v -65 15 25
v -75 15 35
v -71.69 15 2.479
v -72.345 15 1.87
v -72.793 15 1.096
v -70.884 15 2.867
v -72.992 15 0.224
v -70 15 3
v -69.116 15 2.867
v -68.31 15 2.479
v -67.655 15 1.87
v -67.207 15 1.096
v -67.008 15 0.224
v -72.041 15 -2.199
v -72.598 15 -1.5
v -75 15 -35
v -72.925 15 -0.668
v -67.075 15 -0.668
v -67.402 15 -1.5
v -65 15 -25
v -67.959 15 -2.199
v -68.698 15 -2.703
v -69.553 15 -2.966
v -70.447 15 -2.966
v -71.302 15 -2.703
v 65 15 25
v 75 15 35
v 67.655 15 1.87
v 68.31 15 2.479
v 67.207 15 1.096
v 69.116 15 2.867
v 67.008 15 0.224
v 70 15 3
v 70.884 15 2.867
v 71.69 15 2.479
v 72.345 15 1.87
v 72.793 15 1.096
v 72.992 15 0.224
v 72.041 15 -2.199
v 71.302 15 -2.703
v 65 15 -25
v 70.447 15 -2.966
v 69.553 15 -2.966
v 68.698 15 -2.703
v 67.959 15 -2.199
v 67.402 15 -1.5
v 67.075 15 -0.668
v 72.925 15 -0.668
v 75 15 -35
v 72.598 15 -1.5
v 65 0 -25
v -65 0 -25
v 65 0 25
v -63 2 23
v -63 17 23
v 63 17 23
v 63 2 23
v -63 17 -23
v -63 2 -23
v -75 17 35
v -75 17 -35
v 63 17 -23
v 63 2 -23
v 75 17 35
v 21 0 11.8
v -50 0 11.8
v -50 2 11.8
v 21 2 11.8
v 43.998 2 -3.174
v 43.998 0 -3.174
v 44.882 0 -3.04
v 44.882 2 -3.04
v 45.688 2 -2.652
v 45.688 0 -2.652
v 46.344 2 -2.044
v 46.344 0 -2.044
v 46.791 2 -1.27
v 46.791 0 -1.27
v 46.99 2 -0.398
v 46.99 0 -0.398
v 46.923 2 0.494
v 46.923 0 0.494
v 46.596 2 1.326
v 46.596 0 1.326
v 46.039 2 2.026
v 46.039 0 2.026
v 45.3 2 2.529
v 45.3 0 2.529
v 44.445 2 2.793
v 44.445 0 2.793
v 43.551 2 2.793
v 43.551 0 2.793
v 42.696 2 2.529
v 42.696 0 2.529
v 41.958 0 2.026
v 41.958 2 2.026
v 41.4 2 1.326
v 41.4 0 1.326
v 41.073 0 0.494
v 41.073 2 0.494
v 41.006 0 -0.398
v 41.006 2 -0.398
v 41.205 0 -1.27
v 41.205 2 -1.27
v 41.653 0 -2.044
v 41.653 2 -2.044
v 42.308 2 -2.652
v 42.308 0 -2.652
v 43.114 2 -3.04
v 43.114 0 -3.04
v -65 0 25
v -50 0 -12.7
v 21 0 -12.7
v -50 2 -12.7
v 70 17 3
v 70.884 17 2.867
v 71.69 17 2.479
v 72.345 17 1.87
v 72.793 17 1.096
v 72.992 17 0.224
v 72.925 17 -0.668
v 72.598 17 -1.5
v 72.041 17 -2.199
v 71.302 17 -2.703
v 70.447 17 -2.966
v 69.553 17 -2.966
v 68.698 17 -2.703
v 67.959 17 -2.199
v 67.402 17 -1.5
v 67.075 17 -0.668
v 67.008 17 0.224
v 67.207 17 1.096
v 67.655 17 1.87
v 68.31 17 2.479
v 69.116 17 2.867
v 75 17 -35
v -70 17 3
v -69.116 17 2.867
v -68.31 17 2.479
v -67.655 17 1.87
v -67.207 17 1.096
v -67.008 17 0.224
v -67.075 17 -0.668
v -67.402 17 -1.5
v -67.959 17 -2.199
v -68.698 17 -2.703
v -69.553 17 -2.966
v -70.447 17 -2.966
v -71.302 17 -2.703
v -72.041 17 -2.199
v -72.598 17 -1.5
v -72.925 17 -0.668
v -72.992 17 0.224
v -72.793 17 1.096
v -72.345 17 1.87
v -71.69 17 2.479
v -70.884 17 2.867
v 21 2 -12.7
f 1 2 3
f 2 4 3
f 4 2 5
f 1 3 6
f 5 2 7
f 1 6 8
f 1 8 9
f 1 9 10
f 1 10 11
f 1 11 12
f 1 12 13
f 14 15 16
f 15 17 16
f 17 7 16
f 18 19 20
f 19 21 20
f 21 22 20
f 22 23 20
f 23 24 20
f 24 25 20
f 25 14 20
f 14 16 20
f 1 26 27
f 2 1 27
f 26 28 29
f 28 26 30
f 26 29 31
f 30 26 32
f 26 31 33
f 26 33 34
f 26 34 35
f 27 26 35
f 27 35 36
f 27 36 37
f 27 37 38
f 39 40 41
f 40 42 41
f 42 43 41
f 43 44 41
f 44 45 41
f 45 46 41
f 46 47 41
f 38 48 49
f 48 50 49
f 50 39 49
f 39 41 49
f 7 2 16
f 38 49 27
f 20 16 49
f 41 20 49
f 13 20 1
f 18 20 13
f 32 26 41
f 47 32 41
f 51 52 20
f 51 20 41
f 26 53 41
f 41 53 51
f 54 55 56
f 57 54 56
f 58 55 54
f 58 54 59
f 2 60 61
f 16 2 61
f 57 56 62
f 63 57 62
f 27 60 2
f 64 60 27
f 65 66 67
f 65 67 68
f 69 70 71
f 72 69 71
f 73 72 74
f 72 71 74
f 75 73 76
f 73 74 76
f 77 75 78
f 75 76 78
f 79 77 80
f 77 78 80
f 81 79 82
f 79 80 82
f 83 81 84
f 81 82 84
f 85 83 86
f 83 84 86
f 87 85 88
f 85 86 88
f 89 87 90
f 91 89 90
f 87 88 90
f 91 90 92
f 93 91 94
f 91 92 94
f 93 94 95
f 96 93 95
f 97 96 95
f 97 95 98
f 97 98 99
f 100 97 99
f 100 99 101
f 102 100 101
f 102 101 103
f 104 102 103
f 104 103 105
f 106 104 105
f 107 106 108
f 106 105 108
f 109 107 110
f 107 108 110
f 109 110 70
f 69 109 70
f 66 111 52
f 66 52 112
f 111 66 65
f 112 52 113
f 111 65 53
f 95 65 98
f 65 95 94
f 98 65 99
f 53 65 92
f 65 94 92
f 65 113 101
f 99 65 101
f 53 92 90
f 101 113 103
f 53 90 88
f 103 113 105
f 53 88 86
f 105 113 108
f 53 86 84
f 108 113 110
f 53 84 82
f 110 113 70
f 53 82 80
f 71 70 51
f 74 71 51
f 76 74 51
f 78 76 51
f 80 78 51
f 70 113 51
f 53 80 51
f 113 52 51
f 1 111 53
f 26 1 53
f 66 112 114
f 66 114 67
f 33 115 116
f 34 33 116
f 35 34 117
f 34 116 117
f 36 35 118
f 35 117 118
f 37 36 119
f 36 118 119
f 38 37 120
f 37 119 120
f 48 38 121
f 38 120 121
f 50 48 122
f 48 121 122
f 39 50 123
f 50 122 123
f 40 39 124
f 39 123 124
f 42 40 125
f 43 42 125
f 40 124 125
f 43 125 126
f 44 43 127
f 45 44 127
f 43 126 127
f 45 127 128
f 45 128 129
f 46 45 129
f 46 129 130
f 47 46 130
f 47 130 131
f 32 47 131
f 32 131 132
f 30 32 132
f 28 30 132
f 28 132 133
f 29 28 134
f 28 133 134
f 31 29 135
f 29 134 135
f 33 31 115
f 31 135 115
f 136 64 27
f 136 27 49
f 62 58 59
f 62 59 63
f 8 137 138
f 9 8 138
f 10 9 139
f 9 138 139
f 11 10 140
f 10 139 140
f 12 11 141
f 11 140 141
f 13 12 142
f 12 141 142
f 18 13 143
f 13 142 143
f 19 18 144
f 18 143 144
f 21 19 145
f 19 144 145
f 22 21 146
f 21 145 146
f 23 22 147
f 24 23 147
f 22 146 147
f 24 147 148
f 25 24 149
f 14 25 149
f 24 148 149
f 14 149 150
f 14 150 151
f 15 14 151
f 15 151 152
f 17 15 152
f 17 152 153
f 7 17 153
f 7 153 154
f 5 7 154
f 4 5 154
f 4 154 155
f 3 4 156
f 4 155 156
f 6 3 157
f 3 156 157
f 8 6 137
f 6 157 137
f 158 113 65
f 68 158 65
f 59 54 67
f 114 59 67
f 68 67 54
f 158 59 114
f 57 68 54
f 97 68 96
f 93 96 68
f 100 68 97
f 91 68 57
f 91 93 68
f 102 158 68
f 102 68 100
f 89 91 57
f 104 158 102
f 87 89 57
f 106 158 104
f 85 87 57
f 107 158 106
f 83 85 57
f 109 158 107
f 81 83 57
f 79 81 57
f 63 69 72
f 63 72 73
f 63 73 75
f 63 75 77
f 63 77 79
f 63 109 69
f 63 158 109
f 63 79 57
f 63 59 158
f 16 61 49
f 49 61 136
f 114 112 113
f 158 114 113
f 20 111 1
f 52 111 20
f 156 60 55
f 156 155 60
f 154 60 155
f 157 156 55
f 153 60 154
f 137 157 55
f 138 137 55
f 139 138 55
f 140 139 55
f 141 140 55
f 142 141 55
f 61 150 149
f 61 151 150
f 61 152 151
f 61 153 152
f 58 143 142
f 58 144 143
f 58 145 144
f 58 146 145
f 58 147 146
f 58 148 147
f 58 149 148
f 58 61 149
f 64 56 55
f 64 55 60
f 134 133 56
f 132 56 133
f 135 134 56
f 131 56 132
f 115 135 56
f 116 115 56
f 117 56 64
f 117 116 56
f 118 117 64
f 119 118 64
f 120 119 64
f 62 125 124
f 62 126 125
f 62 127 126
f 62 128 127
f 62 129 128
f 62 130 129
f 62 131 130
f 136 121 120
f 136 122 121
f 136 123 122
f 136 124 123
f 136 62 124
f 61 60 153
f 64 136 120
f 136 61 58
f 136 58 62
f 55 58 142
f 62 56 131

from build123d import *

# Parameters (mm, degrees)
CROQUIS1_W              = 130
CROQUIS1_H              = 50
SALIENTE_EXTRUIR1_DEPTH = 30
CROQUIS2_W              = 126
CROQUIS2_H              = 46
CORTAR_EXTRUIR1_DEPTH   = 28
CROQUIS3_R              = 3
CROQUIS3_W              = 70.999999967
CROQUIS3_H              = 24.5
CORTAR_EXTRUIR2_DEPTH   = 2
CROQUIS9_W              = 150
CROQUIS9_H              = 70
CROQUIS9_W_2            = 130
CROQUIS9_H_2            = 50
SALIENTE_EXTRUIR3_DEPTH = 15
CROQUIS9_2_W            = 150
CROQUIS9_2_H            = 70
CROQUIS9_2_W_2          = 130
CROQUIS9_2_H_2          = 50
CORTAR_EXTRUIR5_DEPTH   = 13
CROQUIS11_R             = 3
CORTAR_EXTRUIR6_DEPTH   = 2
CROQUIS12_W             = 50
CROQUIS12_H             = 13
CORTAR_EXTRUIR7_DEPTH   = 130


with BuildPart() as part:
    # Croquis1 → Saliente-Extruir1 (new body)
    with BuildSketch(Plane(origin=(0, 0, 0), x_dir=(1, 0, 0), z_dir=(0, 1, 0))):
        Rectangle(CROQUIS1_W, CROQUIS1_H)
    extrude(amount=SALIENTE_EXTRUIR1_DEPTH)

    # Croquis2 → Cortar-Extruir1 (cut)
    with BuildSketch(Plane(origin=(0, 30, 0), x_dir=(1, 0, 0), z_dir=(0, 1, 0))):
        Rectangle(CROQUIS2_W, CROQUIS2_H)
    extrude(amount=-CORTAR_EXTRUIR1_DEPTH, mode=Mode.SUBTRACT)

    # Croquis3 → Cortar-Extruir2 (cut)
    with BuildSketch(Plane.XZ):
        with Locations(Location((43.9980881, -0.173527089, 0), (0, 0, 270))):
            Circle(CROQUIS3_R)
        with Locations((-14.500000016, -0.45006101)):
            Rectangle(CROQUIS3_W, CROQUIS3_H)
    extrude(amount=-CORTAR_EXTRUIR2_DEPTH, mode=Mode.SUBTRACT)

    # Croquis9 → Saliente-Extruir3 (add)
    with BuildSketch(Plane(origin=(0, 30, 0), x_dir=(1, 0, 0), z_dir=(0, 1, 0))):
        Rectangle(CROQUIS9_W, CROQUIS9_H)
        Rectangle(CROQUIS9_W_2, CROQUIS9_H_2, mode=Mode.SUBTRACT)
    extrude(amount=-SALIENTE_EXTRUIR3_DEPTH)

    # Croquis9<2> → Cortar-Extruir5 (cut)
    with BuildSketch(Plane(origin=(0, 30, 0), x_dir=(1, 0, 0), z_dir=(0, 1, 0))):
        Rectangle(CROQUIS9_2_W, CROQUIS9_2_H)
        Rectangle(CROQUIS9_2_W_2, CROQUIS9_2_H_2, mode=Mode.SUBTRACT)
    extrude(amount=-CORTAR_EXTRUIR5_DEPTH, mode=Mode.SUBTRACT)

    # Croquis11 → Cortar-Extruir6 (cut)
    with BuildSketch(Plane(origin=(0, 17, 0), x_dir=(1, 0, 0), z_dir=(0, 1, 0))):
        with Locations(Location((-70, 0, 0), (0, 0, 270))):
            Circle(CROQUIS11_R)
        with Locations(Location((70, 0, 0), (0, 0, 270))):
            Circle(CROQUIS11_R)
    extrude(amount=-CORTAR_EXTRUIR6_DEPTH, mode=Mode.SUBTRACT)

    # Croquis12 → Cortar-Extruir7 (cut)
    with BuildSketch(Plane.ZY.offset(65)):
        with Locations((0, 23.5)):
            Rectangle(CROQUIS12_W, CROQUIS12_H)
    extrude(amount=-CORTAR_EXTRUIR7_DEPTH, mode=Mode.SUBTRACT)


solid = part.part
